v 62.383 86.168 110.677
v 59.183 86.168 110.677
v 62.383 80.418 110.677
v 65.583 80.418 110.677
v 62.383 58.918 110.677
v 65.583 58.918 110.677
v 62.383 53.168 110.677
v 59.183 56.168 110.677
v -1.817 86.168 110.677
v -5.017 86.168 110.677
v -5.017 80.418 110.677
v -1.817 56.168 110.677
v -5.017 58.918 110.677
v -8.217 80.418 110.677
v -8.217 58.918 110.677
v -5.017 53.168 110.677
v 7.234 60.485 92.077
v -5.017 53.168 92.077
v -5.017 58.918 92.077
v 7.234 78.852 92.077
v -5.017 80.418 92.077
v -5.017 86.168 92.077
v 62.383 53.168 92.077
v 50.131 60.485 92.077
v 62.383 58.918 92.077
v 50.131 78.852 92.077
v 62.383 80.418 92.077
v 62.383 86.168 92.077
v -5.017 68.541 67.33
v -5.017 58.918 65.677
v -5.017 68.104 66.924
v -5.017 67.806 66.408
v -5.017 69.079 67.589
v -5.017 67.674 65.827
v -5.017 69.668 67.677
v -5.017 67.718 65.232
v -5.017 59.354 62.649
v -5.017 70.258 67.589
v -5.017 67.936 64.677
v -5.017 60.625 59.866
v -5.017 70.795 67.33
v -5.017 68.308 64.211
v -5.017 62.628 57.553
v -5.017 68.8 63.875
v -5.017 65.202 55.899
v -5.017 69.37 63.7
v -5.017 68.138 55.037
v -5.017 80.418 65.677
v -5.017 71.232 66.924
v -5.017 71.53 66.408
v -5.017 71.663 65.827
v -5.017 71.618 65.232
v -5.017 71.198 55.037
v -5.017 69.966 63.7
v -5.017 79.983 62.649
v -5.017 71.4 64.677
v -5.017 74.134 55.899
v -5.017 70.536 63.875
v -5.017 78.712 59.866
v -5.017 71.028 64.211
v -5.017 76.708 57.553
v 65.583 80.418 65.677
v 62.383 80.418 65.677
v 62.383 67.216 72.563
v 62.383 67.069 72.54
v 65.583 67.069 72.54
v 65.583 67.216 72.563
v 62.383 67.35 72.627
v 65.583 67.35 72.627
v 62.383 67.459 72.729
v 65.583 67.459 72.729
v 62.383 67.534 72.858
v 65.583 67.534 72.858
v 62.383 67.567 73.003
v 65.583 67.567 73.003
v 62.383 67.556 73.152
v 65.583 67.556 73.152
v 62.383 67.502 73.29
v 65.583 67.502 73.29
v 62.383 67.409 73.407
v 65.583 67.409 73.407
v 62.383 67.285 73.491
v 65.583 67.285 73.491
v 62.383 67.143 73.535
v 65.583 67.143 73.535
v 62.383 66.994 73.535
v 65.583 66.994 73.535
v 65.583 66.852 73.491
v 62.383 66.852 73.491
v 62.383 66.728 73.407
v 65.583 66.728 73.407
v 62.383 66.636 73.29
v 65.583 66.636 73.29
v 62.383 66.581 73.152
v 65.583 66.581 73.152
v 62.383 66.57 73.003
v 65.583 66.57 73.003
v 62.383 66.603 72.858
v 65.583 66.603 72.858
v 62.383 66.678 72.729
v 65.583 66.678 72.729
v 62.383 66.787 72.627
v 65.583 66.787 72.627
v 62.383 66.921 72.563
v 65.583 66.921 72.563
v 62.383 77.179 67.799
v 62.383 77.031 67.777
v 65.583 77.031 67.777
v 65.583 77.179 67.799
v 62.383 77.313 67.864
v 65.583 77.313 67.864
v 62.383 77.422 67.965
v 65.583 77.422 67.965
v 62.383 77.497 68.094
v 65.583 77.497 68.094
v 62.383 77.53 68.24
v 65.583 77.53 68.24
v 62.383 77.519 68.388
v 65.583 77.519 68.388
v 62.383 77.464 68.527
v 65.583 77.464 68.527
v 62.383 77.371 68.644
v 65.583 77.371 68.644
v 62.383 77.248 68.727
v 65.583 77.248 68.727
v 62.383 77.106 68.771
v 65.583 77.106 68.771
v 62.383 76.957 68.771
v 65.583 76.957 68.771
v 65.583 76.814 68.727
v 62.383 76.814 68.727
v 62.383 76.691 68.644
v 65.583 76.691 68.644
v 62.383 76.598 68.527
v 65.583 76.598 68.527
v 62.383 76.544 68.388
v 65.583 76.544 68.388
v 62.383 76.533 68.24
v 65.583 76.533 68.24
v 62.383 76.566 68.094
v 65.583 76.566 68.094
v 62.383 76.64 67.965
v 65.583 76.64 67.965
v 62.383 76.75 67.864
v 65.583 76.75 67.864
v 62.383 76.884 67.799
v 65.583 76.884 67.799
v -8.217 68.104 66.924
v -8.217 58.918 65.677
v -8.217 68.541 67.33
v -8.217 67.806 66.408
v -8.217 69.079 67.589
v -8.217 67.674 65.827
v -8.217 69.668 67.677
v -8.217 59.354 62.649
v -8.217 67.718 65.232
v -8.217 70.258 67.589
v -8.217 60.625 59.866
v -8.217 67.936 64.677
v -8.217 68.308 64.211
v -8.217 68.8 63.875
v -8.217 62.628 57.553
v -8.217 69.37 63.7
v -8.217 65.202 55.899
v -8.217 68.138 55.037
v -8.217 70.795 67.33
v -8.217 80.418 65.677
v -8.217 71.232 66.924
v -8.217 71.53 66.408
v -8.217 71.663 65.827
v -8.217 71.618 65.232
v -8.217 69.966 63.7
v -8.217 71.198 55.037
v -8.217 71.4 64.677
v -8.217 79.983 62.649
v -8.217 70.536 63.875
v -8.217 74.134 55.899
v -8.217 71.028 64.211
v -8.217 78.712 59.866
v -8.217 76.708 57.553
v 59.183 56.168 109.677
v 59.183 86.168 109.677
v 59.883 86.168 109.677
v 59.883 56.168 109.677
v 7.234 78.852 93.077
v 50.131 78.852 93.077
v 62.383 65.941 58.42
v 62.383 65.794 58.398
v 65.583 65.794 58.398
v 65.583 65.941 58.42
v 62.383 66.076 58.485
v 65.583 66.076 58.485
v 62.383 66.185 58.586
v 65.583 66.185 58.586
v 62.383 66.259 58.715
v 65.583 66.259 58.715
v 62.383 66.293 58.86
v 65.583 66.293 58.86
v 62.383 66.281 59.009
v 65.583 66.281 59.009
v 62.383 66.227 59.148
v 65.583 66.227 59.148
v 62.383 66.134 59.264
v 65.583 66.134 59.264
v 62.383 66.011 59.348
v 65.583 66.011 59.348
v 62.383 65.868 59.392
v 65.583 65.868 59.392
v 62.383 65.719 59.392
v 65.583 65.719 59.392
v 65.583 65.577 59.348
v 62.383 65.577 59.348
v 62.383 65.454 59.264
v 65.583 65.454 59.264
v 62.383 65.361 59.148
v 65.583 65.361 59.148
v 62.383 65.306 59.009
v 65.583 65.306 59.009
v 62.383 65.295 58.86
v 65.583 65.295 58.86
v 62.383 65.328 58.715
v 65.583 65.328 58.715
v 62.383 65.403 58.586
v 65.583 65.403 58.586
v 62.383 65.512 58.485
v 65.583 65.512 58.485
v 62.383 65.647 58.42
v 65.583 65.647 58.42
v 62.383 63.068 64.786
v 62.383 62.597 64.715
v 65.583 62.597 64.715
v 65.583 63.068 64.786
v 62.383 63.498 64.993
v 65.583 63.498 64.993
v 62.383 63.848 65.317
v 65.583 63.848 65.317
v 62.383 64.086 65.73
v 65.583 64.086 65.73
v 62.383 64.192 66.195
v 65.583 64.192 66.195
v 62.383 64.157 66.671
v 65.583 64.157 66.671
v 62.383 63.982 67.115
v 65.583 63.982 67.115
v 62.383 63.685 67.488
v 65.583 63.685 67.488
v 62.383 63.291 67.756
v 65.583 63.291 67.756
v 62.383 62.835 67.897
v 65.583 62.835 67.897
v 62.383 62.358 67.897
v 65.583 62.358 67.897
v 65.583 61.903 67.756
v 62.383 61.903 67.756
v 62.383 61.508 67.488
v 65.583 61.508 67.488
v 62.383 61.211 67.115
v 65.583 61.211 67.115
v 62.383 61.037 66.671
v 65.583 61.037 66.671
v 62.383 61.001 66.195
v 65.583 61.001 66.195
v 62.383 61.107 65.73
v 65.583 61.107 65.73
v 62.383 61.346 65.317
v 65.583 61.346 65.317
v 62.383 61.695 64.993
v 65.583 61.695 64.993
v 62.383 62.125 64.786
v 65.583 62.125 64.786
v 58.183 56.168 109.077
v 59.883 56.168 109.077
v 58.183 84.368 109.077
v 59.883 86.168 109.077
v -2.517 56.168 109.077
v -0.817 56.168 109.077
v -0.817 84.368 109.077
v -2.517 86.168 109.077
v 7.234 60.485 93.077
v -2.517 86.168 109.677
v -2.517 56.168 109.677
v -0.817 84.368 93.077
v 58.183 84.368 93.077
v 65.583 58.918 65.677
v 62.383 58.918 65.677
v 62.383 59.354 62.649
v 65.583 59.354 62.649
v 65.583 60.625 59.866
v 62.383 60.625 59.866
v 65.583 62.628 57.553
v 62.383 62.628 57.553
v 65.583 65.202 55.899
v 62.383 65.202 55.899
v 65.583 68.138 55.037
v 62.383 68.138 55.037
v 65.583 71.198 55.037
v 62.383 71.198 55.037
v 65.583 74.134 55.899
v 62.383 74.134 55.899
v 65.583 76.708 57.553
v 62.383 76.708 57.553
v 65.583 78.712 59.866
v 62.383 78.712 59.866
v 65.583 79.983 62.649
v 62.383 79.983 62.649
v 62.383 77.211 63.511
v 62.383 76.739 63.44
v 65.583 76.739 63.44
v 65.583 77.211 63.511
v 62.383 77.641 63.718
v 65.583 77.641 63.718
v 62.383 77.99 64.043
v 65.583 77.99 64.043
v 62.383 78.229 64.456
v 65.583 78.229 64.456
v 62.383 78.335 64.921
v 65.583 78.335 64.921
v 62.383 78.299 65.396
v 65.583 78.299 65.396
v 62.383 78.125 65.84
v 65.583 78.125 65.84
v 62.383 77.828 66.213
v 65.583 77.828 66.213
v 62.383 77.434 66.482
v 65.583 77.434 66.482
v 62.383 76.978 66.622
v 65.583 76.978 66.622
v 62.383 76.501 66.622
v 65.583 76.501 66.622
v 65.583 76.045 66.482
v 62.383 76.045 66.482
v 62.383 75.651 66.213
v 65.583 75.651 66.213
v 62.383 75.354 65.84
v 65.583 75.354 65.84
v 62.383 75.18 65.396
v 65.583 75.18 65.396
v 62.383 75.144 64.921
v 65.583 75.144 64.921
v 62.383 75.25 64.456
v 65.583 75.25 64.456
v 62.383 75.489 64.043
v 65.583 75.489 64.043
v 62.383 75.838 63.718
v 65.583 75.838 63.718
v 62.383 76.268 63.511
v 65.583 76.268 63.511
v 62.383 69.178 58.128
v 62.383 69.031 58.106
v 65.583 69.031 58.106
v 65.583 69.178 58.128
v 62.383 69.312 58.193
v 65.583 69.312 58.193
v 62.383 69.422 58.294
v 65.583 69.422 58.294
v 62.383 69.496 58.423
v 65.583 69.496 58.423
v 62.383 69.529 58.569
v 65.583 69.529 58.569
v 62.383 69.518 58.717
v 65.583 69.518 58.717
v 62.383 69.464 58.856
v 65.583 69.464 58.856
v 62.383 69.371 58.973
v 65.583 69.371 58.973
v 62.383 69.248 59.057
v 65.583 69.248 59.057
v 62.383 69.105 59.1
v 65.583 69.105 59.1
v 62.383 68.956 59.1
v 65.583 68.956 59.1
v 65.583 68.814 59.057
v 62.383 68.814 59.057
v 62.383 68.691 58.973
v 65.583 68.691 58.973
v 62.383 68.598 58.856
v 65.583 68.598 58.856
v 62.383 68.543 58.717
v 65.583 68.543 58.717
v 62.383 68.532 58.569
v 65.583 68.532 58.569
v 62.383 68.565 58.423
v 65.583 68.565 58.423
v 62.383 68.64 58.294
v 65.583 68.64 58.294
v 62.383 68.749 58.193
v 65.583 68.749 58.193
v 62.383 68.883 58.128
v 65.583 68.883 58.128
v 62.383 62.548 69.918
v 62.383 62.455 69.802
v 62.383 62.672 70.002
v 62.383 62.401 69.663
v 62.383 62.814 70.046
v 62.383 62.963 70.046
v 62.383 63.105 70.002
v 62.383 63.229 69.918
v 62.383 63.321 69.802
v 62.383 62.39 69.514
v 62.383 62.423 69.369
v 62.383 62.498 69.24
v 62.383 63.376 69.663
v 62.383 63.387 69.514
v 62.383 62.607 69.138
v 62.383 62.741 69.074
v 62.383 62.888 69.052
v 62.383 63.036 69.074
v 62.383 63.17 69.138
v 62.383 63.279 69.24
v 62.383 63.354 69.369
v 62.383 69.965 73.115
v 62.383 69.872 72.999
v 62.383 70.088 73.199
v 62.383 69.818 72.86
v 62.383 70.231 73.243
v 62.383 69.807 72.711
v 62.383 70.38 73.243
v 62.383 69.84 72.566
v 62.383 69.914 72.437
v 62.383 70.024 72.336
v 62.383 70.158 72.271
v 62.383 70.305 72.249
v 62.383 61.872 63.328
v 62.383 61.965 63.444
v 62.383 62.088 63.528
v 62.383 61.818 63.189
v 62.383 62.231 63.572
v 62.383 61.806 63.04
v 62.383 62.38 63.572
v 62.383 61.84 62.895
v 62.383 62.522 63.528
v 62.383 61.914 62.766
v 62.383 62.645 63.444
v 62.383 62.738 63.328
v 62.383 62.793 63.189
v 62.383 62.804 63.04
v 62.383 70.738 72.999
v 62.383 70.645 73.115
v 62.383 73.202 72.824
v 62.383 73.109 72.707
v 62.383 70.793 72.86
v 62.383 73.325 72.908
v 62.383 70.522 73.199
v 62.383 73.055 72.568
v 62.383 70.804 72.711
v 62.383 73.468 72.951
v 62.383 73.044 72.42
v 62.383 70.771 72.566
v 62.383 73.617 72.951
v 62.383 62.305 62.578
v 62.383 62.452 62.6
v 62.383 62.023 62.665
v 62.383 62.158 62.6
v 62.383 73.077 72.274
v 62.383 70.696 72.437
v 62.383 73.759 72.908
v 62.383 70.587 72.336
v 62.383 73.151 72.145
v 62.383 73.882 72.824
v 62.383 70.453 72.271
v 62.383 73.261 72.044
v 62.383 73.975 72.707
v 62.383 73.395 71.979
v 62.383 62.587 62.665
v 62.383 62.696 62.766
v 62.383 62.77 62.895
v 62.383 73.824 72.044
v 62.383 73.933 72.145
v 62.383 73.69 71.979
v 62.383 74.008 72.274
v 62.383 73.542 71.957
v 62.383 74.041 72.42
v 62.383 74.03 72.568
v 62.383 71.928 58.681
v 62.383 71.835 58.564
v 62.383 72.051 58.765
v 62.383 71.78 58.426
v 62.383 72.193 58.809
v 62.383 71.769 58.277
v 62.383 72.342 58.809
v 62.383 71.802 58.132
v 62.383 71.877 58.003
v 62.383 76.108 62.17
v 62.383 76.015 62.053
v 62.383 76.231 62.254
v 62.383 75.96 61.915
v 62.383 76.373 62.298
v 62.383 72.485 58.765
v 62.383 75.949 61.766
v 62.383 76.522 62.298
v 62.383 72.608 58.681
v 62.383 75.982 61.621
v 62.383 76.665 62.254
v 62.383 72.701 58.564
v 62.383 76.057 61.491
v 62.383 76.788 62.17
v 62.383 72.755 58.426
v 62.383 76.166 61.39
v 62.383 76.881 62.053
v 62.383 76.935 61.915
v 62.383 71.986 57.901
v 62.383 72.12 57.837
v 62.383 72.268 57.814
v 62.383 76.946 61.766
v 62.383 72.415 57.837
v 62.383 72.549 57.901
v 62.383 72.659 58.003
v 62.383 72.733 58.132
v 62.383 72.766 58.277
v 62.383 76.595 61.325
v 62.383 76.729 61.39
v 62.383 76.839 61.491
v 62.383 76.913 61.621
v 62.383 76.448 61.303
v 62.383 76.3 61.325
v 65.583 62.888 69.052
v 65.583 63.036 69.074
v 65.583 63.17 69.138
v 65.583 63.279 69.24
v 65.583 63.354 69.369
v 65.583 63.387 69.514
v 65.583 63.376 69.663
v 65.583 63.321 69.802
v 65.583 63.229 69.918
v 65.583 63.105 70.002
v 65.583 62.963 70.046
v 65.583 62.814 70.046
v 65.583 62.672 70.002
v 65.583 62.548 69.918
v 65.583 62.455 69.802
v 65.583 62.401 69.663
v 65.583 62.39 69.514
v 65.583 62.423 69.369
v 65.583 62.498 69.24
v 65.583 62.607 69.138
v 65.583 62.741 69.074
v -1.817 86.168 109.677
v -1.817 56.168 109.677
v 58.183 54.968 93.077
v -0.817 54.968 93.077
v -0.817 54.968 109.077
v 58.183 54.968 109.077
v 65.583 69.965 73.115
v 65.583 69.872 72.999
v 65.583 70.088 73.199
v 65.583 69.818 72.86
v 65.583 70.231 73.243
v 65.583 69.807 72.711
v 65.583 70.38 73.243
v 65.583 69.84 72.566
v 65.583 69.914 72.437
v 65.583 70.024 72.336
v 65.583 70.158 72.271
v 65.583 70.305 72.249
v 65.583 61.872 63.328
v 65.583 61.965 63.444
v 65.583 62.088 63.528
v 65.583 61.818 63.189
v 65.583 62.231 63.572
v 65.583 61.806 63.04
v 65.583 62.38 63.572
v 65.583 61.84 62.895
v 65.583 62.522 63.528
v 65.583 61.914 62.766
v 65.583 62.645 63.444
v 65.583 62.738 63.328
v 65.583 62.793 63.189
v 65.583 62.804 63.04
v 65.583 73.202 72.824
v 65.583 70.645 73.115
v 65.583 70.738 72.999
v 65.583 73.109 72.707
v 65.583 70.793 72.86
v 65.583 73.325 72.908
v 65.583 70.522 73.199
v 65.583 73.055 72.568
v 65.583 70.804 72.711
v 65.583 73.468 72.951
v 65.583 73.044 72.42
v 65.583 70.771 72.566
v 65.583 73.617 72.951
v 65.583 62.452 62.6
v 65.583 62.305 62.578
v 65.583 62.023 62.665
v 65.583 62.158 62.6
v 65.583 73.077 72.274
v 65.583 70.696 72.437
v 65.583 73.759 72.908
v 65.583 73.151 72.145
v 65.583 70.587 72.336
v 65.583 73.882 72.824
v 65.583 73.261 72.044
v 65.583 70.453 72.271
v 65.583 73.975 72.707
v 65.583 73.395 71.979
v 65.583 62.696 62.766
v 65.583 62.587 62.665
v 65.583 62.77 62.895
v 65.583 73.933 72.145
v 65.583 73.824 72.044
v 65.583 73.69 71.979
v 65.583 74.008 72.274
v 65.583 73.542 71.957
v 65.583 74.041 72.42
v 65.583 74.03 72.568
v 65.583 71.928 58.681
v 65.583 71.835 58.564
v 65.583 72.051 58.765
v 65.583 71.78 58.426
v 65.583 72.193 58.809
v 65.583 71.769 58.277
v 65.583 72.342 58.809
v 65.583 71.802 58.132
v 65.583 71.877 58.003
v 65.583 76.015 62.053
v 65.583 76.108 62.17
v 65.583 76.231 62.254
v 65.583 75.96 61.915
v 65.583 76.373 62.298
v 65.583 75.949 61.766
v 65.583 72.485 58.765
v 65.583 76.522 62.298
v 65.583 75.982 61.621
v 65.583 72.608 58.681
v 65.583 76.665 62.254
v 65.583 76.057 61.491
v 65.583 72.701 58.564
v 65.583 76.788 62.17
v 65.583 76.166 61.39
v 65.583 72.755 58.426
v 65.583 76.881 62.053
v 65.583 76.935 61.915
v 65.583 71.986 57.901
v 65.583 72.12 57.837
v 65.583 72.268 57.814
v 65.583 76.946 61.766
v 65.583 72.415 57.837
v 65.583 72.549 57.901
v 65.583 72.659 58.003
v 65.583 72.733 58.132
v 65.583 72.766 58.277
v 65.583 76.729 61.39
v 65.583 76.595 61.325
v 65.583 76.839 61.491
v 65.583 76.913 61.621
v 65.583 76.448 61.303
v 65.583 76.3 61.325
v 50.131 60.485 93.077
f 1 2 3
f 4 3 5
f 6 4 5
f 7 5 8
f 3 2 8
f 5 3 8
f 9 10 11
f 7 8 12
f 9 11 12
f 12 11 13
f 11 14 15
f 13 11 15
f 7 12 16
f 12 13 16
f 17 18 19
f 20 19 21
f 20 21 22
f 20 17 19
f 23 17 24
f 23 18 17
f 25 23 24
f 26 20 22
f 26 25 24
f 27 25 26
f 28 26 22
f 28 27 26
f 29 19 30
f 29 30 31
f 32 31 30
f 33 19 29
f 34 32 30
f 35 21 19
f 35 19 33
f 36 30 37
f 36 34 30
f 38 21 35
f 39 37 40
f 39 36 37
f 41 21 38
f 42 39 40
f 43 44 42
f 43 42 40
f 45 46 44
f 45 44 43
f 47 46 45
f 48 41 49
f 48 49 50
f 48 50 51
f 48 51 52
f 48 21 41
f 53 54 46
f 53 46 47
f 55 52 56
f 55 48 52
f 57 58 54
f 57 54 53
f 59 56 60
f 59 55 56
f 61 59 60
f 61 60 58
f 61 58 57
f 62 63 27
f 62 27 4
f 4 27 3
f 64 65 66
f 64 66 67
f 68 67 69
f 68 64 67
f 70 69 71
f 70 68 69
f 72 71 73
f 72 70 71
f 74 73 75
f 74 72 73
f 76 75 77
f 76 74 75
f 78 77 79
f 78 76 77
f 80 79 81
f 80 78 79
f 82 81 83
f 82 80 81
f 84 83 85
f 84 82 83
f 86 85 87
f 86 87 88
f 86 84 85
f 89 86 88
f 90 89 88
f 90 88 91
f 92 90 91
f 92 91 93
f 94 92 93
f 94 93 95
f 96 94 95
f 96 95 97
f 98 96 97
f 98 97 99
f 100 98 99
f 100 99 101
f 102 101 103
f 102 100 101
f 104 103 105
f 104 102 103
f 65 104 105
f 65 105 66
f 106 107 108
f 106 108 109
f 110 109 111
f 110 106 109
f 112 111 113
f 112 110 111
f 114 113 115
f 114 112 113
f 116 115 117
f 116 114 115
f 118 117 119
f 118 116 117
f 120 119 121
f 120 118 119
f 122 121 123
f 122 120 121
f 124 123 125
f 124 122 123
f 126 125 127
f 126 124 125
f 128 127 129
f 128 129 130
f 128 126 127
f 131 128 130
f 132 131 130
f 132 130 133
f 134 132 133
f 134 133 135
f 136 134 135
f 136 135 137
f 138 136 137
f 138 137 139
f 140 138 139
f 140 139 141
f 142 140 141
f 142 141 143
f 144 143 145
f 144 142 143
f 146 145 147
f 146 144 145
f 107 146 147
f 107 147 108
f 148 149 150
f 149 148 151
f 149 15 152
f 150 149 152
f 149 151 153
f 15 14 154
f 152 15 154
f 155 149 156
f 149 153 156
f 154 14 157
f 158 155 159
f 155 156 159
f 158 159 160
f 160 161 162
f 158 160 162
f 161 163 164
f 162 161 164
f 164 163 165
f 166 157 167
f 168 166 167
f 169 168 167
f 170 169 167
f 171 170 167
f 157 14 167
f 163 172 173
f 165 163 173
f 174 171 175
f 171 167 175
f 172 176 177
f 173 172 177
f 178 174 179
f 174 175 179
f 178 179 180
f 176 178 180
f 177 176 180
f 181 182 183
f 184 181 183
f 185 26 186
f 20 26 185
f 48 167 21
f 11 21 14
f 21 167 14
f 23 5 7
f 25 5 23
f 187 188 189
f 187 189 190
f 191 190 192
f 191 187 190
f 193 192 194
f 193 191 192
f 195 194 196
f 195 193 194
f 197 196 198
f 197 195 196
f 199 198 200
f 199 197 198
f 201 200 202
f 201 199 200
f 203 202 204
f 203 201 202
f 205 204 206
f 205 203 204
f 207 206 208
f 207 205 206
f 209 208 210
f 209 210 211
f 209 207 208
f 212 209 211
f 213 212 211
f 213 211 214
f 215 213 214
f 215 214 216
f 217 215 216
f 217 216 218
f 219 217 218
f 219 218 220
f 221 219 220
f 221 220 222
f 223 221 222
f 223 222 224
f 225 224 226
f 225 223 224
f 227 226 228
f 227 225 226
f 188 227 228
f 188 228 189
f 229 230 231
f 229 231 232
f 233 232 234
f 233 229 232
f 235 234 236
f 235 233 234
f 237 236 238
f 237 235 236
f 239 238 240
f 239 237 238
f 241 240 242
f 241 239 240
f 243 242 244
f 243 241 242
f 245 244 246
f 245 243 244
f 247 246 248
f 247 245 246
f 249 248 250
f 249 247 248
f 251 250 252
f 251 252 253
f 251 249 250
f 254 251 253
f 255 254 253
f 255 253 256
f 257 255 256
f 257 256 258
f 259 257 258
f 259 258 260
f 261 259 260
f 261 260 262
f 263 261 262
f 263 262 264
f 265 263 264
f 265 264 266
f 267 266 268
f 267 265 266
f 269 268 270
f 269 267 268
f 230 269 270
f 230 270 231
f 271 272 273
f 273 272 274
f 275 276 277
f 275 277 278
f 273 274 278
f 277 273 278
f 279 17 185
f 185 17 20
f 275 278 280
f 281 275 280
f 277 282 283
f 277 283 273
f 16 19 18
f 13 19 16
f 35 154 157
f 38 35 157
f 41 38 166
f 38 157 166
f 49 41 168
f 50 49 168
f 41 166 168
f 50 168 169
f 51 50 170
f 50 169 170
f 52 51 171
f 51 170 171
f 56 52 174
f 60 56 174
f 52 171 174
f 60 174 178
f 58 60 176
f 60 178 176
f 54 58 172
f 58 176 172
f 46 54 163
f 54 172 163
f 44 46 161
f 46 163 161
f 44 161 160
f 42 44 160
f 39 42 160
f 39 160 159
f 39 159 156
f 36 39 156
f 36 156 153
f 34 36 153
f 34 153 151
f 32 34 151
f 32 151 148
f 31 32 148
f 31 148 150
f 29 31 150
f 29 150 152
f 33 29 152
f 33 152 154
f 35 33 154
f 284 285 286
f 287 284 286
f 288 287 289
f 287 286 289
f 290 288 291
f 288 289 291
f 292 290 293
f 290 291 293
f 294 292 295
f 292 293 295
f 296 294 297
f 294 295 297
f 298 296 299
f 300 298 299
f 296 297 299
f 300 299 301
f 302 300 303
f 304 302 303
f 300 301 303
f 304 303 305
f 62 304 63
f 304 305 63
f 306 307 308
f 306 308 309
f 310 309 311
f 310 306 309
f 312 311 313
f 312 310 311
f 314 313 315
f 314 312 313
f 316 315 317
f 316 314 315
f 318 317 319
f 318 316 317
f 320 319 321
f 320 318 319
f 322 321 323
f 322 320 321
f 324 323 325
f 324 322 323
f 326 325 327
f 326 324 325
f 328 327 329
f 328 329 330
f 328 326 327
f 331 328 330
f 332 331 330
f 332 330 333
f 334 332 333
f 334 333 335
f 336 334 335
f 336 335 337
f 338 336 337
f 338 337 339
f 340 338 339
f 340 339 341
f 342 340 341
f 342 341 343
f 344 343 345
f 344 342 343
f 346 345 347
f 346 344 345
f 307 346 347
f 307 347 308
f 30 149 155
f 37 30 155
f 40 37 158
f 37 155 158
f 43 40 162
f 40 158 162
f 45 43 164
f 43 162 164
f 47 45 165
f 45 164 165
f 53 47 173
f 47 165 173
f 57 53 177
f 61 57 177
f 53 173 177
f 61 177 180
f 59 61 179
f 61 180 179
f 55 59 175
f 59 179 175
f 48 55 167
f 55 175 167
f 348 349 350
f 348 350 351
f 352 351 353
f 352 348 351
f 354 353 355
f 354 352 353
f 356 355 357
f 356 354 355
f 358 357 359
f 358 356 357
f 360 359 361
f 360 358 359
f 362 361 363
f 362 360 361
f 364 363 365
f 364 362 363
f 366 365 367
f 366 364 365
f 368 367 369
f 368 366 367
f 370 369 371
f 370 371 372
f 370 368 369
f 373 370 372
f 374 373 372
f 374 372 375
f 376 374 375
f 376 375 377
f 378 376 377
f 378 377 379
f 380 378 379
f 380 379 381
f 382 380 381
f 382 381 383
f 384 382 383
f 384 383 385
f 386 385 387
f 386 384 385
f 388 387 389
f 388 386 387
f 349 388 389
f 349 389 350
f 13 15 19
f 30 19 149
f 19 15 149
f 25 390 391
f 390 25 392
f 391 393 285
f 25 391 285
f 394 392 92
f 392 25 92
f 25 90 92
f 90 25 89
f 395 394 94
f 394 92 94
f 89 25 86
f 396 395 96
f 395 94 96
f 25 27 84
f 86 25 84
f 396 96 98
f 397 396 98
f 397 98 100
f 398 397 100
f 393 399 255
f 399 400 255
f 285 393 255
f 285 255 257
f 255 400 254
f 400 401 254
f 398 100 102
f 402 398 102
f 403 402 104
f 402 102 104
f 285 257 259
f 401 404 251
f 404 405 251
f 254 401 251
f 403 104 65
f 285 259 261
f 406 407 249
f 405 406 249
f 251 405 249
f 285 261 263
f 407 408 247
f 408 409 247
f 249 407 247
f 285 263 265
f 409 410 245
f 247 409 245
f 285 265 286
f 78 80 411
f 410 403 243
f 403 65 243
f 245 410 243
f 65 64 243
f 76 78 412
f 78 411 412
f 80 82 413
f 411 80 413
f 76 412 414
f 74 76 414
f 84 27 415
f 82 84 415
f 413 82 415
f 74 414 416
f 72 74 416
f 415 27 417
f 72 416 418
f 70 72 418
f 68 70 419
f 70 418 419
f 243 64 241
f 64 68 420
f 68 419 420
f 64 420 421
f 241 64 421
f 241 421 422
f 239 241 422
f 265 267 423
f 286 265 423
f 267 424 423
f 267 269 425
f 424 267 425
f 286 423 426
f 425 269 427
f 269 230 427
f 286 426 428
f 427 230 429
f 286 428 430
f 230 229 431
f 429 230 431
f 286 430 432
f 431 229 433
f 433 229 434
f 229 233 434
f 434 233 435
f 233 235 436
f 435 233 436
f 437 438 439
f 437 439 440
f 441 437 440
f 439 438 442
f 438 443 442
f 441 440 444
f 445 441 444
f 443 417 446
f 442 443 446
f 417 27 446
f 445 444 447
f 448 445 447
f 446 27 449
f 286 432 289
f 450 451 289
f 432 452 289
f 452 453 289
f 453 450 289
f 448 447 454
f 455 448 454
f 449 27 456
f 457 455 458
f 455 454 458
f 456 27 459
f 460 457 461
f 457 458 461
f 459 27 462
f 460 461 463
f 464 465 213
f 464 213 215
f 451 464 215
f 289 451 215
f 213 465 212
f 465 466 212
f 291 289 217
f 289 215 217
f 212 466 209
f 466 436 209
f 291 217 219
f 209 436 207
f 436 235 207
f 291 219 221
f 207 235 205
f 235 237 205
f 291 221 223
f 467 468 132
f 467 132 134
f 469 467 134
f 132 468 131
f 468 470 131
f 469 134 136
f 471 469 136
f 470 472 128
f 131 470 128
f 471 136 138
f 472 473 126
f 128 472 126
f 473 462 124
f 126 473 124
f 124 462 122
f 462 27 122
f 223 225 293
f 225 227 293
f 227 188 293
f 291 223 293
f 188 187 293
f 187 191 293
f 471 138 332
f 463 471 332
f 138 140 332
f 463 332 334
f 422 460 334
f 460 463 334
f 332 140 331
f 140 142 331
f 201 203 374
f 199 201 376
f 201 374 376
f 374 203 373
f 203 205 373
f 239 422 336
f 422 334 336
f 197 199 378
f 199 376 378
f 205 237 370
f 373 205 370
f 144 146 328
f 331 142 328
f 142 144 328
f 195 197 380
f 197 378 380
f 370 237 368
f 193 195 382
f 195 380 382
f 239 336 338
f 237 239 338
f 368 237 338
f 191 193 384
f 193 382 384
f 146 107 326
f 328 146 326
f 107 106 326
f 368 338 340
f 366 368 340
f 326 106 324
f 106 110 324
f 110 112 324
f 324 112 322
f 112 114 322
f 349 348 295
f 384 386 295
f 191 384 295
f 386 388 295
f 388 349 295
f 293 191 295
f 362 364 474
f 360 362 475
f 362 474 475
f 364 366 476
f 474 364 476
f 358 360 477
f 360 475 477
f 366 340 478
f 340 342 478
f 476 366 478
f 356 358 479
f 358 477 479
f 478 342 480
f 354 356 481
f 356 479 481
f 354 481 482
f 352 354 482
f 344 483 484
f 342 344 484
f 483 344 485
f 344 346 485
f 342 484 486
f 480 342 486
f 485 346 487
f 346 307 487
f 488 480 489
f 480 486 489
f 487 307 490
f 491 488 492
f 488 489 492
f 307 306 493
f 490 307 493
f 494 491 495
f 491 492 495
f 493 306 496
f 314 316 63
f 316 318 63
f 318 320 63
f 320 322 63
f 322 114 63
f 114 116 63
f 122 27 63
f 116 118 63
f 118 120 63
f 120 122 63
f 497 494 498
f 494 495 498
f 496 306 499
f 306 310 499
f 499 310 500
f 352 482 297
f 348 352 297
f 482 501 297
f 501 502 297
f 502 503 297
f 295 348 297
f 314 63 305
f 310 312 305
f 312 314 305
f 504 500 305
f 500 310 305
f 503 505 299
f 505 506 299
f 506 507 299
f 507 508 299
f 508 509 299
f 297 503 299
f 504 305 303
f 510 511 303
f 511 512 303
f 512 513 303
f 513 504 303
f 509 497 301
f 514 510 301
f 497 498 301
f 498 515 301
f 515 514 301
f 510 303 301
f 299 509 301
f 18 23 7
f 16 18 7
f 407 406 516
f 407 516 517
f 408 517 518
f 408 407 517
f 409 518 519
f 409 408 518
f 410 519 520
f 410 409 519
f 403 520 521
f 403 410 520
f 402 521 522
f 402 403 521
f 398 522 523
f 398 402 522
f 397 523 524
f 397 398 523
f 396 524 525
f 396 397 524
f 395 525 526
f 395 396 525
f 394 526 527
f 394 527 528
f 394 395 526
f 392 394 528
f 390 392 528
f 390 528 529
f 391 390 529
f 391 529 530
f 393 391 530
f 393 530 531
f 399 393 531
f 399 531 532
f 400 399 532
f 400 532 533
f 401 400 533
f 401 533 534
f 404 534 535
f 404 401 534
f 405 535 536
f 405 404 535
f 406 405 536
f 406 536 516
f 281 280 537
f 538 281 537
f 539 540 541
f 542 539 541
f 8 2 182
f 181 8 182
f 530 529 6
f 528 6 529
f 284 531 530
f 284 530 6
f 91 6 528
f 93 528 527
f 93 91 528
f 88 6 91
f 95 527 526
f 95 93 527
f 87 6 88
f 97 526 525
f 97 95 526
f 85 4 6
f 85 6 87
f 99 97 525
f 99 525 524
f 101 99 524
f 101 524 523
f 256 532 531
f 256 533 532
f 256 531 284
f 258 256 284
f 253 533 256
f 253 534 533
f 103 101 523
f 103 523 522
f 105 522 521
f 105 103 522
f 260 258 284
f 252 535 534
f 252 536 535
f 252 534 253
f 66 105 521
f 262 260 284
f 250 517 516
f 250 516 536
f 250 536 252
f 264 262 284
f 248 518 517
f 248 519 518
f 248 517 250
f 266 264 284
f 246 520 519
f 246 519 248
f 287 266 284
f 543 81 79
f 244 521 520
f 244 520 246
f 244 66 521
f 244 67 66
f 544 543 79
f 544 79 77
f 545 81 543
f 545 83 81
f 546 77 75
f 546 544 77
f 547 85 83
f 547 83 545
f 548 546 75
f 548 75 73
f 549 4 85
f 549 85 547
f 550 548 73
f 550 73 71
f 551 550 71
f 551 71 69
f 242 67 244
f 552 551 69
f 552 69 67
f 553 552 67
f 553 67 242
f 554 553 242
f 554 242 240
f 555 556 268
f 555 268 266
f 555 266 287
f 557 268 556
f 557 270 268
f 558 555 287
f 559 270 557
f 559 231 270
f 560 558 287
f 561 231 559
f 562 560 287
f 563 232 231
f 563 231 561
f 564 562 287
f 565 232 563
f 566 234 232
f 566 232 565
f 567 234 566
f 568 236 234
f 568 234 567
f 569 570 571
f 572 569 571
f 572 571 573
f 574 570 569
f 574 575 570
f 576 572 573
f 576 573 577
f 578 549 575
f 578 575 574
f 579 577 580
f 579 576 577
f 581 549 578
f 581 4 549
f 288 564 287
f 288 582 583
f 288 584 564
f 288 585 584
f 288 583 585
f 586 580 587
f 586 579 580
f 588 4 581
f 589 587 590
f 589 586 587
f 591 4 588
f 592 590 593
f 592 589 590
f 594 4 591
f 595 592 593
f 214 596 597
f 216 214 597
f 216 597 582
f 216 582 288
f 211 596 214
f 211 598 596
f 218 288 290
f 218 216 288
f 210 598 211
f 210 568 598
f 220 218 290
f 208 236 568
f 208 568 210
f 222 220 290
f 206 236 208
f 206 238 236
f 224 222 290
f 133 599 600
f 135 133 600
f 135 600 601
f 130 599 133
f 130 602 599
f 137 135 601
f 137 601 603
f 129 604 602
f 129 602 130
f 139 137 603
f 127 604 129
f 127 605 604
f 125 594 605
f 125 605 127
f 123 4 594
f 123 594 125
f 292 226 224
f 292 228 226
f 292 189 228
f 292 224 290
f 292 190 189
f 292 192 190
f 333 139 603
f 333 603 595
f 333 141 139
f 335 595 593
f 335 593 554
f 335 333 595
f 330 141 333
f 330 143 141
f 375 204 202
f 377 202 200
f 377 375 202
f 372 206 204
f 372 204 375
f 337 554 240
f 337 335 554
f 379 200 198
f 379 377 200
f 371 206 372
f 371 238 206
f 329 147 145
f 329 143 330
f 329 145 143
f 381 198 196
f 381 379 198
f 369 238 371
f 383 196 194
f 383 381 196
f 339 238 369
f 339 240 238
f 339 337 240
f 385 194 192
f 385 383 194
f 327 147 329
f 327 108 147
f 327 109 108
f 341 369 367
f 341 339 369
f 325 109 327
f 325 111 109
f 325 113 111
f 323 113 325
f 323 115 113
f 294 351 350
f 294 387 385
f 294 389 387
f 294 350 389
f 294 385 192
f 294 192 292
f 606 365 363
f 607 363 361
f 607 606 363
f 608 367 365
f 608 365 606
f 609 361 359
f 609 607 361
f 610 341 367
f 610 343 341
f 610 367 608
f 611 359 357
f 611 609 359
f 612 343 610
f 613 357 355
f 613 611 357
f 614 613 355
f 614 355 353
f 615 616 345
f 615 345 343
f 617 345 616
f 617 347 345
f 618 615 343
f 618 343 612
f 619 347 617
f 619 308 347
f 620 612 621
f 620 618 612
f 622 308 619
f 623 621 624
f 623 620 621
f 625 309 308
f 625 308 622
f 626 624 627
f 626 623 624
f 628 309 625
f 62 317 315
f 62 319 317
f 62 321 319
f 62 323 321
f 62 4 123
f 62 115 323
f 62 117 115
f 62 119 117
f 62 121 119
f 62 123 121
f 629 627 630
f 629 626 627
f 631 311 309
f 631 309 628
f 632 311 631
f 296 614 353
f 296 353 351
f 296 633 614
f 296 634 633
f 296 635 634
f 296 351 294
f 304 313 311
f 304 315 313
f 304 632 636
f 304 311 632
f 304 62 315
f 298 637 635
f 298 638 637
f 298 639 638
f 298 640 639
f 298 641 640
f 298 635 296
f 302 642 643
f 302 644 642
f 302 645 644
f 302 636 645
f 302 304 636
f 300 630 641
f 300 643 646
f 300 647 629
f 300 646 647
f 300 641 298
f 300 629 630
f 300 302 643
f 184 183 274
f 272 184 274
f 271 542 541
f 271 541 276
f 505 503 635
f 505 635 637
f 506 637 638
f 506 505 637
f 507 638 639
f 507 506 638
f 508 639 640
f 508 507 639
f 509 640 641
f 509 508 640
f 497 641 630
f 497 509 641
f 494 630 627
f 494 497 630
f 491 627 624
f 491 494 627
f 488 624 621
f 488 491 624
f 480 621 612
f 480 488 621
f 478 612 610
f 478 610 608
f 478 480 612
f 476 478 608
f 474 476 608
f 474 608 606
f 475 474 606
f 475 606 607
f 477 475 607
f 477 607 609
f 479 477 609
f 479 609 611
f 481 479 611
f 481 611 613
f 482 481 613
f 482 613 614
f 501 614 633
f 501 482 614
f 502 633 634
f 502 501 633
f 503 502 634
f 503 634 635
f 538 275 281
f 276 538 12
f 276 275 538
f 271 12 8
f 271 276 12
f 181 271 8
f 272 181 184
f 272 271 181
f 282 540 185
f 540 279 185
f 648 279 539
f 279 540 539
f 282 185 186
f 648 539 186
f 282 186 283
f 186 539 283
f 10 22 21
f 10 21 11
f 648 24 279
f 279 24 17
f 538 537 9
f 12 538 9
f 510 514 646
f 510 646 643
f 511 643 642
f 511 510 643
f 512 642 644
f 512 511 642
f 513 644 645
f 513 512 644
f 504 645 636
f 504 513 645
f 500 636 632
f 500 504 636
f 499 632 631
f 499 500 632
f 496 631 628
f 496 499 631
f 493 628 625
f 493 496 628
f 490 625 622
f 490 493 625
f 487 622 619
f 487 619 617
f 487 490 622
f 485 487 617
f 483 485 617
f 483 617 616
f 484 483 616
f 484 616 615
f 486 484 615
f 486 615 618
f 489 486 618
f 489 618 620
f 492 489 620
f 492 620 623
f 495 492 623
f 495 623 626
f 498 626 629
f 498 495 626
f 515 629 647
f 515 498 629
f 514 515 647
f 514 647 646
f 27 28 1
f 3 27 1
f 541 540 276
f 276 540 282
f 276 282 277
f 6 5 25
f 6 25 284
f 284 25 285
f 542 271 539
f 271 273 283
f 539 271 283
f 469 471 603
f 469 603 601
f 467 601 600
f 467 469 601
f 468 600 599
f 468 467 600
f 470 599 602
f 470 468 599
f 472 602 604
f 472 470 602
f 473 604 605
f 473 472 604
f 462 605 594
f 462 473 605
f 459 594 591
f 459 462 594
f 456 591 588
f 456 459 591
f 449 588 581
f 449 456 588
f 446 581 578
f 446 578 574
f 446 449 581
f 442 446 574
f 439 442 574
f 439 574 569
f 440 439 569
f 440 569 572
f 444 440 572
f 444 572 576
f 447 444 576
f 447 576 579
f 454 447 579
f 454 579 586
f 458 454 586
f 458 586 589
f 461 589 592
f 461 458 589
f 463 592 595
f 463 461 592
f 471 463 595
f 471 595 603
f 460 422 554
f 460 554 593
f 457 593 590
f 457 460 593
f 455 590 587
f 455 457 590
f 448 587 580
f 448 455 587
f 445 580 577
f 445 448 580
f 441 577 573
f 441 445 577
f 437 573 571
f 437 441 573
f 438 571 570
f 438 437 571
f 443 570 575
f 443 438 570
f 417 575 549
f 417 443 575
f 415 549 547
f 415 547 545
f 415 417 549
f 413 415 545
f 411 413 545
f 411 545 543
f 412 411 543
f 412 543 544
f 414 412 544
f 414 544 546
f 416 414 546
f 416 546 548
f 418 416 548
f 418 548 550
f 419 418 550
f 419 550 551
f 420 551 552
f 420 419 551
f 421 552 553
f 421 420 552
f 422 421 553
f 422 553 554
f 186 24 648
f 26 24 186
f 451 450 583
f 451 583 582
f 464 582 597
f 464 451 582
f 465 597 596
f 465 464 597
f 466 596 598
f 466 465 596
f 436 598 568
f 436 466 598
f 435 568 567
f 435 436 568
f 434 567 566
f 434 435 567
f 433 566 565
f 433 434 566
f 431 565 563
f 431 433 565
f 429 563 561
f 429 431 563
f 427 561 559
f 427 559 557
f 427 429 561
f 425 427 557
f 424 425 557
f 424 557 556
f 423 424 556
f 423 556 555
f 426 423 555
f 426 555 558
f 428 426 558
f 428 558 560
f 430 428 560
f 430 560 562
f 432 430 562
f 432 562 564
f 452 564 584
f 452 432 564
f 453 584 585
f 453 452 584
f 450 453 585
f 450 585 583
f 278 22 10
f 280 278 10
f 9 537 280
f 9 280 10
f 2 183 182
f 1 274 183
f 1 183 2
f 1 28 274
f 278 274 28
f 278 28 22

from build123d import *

# Parameters (mm, degrees)
SKETCH_2_R          = 1.6
SKETCH_2_R_2        = 0.5
BOSS_EXTRUDE1_DEPTH = 3.2
SKETCH1_W           = 18.6
SKETCH1_H           = 33
SKETCH1_W_2         = 16
SKETCH1_H_2         = 29.4
BOSS_EXTRUDE2_DEPTH = 67.4
CUT_EXTRUDE1_REACH  = 116.482
SKETCH2_W           = 42.896922538
SKETCH2_H           = 18.367032987
CUT_EXTRUDE2_REACH  = 123.795
SKETCH3_W           = 27
SKETCH3_H           = 17
BOSS_EXTRUDE3_START = 3.2
BOSS_EXTRUDE3_DEPTH = 3.2
SKETCH5_R           = 2
CUT_EXTRUDE3_DEPTH  = 10
SKETCH6_W           = 16
SKETCH6_H           = 29.4
BOSS_EXTRUDE4_DEPTH = 4.2
SKETCH7_W           = 16
SKETCH7_H           = 29.4
BOSS_EXTRUDE5_DEPTH = 4.2
CUT_EXTRUDE5_DEPTH  = 30


with BuildPart() as part:
    # 스케치2 → Boss-Extrude1 (new body)
    with BuildSketch(Plane(origin=(62.38287134, 0, 0), x_dir=(0, 0, -1), z_dir=(1, 0, 0))):
        with BuildLine():
            Line((-65.677419436, 80.41810471), (-110.677419436, 80.41810471))
            Line((-110.677419436, 80.41810471), (-110.677419436, 58.91810471))
            Line((-110.677419436, 58.91810471), (-65.677419436, 58.91810471))
            ThreePointArc((-65.677419436, 58.91810471), (-54.927419436, 69.66810471), (-65.677419436, 80.41810471))
        make_face()
        with Locations((-66.314714345, 62.596764299)):
            Circle(SKETCH_2_R, mode=Mode.SUBTRACT)
        with Locations((-61.803243354, 76.447725619)):
            Circle(SKETCH_2_R_2, mode=Mode.SUBTRACT)
        with Locations((-68.277005701, 77.03116462)):
            Circle(SKETCH_2_R_2, mode=Mode.SUBTRACT)
        with Locations((-72.457040346, 73.542280792)):
            Circle(SKETCH_2_R_2, mode=Mode.SUBTRACT)
        with Locations((-72.748759847, 70.305399618)):
            Circle(SKETCH_2_R_2, mode=Mode.SUBTRACT)
        with Locations((-73.040479347, 67.068518444)):
            Circle(SKETCH_2_R_2, mode=Mode.SUBTRACT)
        with Locations((-69.551595519, 62.8884838)):
            Circle(SKETCH_2_R_2, mode=Mode.SUBTRACT)
        with Locations((-63.077833171, 62.305044799)):
            Circle(SKETCH_2_R_2, mode=Mode.SUBTRACT)
        with Locations((-58.897798526, 65.793928627)):
            Circle(SKETCH_2_R_2, mode=Mode.SUBTRACT)
        with Locations((-58.606079026, 69.030809801)):
            Circle(SKETCH_2_R_2, mode=Mode.SUBTRACT)
        with Locations((-58.314359525, 72.267690975)):
            Circle(SKETCH_2_R_2, mode=Mode.SUBTRACT)
        with Locations((-65.040124528, 76.73944512)):
            Circle(SKETCH_2_R, mode=Mode.SUBTRACT)
    extrude(amount=BOSS_EXTRUDE1_DEPTH)

    # Sketch1 → Boss-Extrude2 (add)
    with BuildSketch(Plane.ZY.offset(-62.38287134)):
        with Locations((101.377419436, 69.66810471)):
            Rectangle(SKETCH1_W, SKETCH1_H)
        with Locations((101.077419436, 69.66810471)):
            Rectangle(SKETCH1_W_2, SKETCH1_H_2, mode=Mode.SUBTRACT)
    extrude(amount=BOSS_EXTRUDE2_DEPTH)

    # Sketch2 → Cut-Extrude1 (cut, up to next)
    with BuildSketch(Plane(origin=(0, 0, 92.077419436), x_dir=(-1, 0, 0), z_dir=(0, 0, -1)), mode=Mode.PRIVATE) as cut_extrude1_sk1:
        with Locations((-28.68287134, 69.668104709)):
            Rectangle(SKETCH2_W, SKETCH2_H)
    cut_extrude1_tool1 = extrude(cut_extrude1_sk1.sketch, amount=-CUT_EXTRUDE1_REACH, mode=Mode.PRIVATE) & part.part
    add(cut_extrude1_tool1.solids().sort_by_distance((28.682871, 69.668105, 92.077419))[0], mode=Mode.SUBTRACT)

    # Sketch3 → Cut-Extrude2 (cut, up to next)
    with BuildSketch(Plane.XY.offset(110.677419436), mode=Mode.PRIVATE) as cut_extrude2_sk1:
        with Locations((28.68287134, 69.66810471)):
            Rectangle(SKETCH3_W, SKETCH3_H)
    cut_extrude2_tool1 = extrude(cut_extrude2_sk1.sketch, amount=-CUT_EXTRUDE2_REACH, mode=Mode.PRIVATE) & part.part
    add(cut_extrude2_tool1.solids().sort_by_distance((28.682871, 69.668105, 110.677419))[0], mode=Mode.SUBTRACT)

    # Sketch4 → Boss-Extrude3 (add)
    with BuildSketch(Plane.ZY.offset(5.01712866).offset(BOSS_EXTRUDE3_START)):
        with BuildLine():
            Line((65.677419436, 80.41810471), (110.677419436, 80.41810471))
            Line((110.677419436, 80.41810471), (110.677419436, 58.91810471))
            Line((110.677419436, 58.91810471), (65.677419436, 58.91810471))
            ThreePointArc((65.677419436, 58.91810471), (54.927419436, 69.66810471), (65.677419436, 80.41810471))
        make_face()
    extrude(amount=-BOSS_EXTRUDE3_DEPTH)

    # Sketch5 → Cut-Extrude3 (cut)
    with BuildSketch(Plane.ZY.offset(8.21712866)):
        with Locations((65.677419436, 69.66810471)):
            Circle(SKETCH5_R)
    extrude(amount=-CUT_EXTRUDE3_DEPTH, mode=Mode.SUBTRACT)

    # Sketch6 → Boss-Extrude4 (add)
    with BuildSketch(Plane(origin=(62.38287134, 0, 0), x_dir=(0, 0, -1), z_dir=(1, 0, 0))):
        with Locations((-101.077419436, 69.66810471)):
            Rectangle(SKETCH6_W, SKETCH6_H)
    extrude(amount=-BOSS_EXTRUDE4_DEPTH)

    # Sketch7 → Boss-Extrude5 (add)
    with BuildSketch(Plane.ZY.offset(5.01712866)):
        with Locations((101.077419436, 69.66810471)):
            Rectangle(SKETCH7_W, SKETCH7_H)
    extrude(amount=-BOSS_EXTRUDE5_DEPTH)

    # Sketch10 → Cut-Extrude5 (cut)
    with BuildSketch(Plane(origin=(0, 86.16810471, 0), x_dir=(1, 0, 0), z_dir=(0, 1, 0))):
        Polygon((-1.81712866, -110.677419436), (59.18287134, -110.677419436), (59.18287134, -109.677419436), (59.88287134, -109.677419436), (59.88287134, -109.077419436), (-2.51712866, -109.077419436), (-2.51712866, -109.677419436), (-1.81712866, -109.677419436), align=None)
    extrude(amount=-CUT_EXTRUDE5_DEPTH, mode=Mode.SUBTRACT)


solid = part.part
